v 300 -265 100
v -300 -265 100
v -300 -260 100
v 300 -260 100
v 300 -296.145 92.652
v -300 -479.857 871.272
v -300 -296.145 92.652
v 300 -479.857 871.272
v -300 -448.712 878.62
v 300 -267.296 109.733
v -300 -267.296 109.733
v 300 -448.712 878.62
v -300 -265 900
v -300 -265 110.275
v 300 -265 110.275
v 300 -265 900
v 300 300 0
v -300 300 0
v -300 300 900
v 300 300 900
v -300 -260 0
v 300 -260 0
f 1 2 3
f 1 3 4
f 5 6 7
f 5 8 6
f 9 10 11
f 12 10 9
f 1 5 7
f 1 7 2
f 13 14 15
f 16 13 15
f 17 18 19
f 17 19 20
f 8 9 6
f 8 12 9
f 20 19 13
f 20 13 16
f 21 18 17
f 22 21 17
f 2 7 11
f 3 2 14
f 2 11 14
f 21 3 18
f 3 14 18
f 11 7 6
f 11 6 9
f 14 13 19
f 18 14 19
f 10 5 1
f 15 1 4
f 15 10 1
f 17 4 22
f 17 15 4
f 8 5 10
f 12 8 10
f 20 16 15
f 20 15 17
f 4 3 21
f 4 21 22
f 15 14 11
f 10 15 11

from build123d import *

# Parameters (mm, degrees)
F0_W     = 600
F0_H     = 600
F1_DEPTH = 900
F2_W     = 600
F2_H     = 100
F3_DEPTH = 40
F4_W     = 600
F4_H     = 800
F5_DEPTH = 35
F7_DEPTH = 300


with BuildPart() as f1:
    # F0 (on Top) → F1 (new body)
    with BuildSketch(Plane.XY):
        Rectangle(F0_W, F0_H)
    extrude(amount=F1_DEPTH)

    # F2 (on face) → F3 (cut)
    with BuildSketch(Plane.XZ.offset(300)):
        with Locations((0, 50)):
            Rectangle(F2_W, F2_H)
    extrude(amount=-F3_DEPTH, mode=Mode.SUBTRACT)

    # F4 (on face) → F5 (cut)
    with BuildSketch(Plane.XZ.offset(300)):
        with Locations((0, 500)):
            Rectangle(F4_W, F4_H)
    extrude(amount=-F5_DEPTH, mode=Mode.SUBTRACT)

    # F6 (on Right) → F7 (join, symmetric)
    with BuildSketch(Plane.YZ):
        Polygon((-296.1448182649, 92.6515106829), (-265, 100), (-255.2672442922, 102.2964029116), (-257.5636472038, 112.0291586194), (-267.2964029116, 109.7327557078), (-448.7122329282, 878.6204566235), (-479.8570511932, 871.2719673063), align=None)
    extrude(amount=F7_DEPTH, both=True)


solid = f1.part
